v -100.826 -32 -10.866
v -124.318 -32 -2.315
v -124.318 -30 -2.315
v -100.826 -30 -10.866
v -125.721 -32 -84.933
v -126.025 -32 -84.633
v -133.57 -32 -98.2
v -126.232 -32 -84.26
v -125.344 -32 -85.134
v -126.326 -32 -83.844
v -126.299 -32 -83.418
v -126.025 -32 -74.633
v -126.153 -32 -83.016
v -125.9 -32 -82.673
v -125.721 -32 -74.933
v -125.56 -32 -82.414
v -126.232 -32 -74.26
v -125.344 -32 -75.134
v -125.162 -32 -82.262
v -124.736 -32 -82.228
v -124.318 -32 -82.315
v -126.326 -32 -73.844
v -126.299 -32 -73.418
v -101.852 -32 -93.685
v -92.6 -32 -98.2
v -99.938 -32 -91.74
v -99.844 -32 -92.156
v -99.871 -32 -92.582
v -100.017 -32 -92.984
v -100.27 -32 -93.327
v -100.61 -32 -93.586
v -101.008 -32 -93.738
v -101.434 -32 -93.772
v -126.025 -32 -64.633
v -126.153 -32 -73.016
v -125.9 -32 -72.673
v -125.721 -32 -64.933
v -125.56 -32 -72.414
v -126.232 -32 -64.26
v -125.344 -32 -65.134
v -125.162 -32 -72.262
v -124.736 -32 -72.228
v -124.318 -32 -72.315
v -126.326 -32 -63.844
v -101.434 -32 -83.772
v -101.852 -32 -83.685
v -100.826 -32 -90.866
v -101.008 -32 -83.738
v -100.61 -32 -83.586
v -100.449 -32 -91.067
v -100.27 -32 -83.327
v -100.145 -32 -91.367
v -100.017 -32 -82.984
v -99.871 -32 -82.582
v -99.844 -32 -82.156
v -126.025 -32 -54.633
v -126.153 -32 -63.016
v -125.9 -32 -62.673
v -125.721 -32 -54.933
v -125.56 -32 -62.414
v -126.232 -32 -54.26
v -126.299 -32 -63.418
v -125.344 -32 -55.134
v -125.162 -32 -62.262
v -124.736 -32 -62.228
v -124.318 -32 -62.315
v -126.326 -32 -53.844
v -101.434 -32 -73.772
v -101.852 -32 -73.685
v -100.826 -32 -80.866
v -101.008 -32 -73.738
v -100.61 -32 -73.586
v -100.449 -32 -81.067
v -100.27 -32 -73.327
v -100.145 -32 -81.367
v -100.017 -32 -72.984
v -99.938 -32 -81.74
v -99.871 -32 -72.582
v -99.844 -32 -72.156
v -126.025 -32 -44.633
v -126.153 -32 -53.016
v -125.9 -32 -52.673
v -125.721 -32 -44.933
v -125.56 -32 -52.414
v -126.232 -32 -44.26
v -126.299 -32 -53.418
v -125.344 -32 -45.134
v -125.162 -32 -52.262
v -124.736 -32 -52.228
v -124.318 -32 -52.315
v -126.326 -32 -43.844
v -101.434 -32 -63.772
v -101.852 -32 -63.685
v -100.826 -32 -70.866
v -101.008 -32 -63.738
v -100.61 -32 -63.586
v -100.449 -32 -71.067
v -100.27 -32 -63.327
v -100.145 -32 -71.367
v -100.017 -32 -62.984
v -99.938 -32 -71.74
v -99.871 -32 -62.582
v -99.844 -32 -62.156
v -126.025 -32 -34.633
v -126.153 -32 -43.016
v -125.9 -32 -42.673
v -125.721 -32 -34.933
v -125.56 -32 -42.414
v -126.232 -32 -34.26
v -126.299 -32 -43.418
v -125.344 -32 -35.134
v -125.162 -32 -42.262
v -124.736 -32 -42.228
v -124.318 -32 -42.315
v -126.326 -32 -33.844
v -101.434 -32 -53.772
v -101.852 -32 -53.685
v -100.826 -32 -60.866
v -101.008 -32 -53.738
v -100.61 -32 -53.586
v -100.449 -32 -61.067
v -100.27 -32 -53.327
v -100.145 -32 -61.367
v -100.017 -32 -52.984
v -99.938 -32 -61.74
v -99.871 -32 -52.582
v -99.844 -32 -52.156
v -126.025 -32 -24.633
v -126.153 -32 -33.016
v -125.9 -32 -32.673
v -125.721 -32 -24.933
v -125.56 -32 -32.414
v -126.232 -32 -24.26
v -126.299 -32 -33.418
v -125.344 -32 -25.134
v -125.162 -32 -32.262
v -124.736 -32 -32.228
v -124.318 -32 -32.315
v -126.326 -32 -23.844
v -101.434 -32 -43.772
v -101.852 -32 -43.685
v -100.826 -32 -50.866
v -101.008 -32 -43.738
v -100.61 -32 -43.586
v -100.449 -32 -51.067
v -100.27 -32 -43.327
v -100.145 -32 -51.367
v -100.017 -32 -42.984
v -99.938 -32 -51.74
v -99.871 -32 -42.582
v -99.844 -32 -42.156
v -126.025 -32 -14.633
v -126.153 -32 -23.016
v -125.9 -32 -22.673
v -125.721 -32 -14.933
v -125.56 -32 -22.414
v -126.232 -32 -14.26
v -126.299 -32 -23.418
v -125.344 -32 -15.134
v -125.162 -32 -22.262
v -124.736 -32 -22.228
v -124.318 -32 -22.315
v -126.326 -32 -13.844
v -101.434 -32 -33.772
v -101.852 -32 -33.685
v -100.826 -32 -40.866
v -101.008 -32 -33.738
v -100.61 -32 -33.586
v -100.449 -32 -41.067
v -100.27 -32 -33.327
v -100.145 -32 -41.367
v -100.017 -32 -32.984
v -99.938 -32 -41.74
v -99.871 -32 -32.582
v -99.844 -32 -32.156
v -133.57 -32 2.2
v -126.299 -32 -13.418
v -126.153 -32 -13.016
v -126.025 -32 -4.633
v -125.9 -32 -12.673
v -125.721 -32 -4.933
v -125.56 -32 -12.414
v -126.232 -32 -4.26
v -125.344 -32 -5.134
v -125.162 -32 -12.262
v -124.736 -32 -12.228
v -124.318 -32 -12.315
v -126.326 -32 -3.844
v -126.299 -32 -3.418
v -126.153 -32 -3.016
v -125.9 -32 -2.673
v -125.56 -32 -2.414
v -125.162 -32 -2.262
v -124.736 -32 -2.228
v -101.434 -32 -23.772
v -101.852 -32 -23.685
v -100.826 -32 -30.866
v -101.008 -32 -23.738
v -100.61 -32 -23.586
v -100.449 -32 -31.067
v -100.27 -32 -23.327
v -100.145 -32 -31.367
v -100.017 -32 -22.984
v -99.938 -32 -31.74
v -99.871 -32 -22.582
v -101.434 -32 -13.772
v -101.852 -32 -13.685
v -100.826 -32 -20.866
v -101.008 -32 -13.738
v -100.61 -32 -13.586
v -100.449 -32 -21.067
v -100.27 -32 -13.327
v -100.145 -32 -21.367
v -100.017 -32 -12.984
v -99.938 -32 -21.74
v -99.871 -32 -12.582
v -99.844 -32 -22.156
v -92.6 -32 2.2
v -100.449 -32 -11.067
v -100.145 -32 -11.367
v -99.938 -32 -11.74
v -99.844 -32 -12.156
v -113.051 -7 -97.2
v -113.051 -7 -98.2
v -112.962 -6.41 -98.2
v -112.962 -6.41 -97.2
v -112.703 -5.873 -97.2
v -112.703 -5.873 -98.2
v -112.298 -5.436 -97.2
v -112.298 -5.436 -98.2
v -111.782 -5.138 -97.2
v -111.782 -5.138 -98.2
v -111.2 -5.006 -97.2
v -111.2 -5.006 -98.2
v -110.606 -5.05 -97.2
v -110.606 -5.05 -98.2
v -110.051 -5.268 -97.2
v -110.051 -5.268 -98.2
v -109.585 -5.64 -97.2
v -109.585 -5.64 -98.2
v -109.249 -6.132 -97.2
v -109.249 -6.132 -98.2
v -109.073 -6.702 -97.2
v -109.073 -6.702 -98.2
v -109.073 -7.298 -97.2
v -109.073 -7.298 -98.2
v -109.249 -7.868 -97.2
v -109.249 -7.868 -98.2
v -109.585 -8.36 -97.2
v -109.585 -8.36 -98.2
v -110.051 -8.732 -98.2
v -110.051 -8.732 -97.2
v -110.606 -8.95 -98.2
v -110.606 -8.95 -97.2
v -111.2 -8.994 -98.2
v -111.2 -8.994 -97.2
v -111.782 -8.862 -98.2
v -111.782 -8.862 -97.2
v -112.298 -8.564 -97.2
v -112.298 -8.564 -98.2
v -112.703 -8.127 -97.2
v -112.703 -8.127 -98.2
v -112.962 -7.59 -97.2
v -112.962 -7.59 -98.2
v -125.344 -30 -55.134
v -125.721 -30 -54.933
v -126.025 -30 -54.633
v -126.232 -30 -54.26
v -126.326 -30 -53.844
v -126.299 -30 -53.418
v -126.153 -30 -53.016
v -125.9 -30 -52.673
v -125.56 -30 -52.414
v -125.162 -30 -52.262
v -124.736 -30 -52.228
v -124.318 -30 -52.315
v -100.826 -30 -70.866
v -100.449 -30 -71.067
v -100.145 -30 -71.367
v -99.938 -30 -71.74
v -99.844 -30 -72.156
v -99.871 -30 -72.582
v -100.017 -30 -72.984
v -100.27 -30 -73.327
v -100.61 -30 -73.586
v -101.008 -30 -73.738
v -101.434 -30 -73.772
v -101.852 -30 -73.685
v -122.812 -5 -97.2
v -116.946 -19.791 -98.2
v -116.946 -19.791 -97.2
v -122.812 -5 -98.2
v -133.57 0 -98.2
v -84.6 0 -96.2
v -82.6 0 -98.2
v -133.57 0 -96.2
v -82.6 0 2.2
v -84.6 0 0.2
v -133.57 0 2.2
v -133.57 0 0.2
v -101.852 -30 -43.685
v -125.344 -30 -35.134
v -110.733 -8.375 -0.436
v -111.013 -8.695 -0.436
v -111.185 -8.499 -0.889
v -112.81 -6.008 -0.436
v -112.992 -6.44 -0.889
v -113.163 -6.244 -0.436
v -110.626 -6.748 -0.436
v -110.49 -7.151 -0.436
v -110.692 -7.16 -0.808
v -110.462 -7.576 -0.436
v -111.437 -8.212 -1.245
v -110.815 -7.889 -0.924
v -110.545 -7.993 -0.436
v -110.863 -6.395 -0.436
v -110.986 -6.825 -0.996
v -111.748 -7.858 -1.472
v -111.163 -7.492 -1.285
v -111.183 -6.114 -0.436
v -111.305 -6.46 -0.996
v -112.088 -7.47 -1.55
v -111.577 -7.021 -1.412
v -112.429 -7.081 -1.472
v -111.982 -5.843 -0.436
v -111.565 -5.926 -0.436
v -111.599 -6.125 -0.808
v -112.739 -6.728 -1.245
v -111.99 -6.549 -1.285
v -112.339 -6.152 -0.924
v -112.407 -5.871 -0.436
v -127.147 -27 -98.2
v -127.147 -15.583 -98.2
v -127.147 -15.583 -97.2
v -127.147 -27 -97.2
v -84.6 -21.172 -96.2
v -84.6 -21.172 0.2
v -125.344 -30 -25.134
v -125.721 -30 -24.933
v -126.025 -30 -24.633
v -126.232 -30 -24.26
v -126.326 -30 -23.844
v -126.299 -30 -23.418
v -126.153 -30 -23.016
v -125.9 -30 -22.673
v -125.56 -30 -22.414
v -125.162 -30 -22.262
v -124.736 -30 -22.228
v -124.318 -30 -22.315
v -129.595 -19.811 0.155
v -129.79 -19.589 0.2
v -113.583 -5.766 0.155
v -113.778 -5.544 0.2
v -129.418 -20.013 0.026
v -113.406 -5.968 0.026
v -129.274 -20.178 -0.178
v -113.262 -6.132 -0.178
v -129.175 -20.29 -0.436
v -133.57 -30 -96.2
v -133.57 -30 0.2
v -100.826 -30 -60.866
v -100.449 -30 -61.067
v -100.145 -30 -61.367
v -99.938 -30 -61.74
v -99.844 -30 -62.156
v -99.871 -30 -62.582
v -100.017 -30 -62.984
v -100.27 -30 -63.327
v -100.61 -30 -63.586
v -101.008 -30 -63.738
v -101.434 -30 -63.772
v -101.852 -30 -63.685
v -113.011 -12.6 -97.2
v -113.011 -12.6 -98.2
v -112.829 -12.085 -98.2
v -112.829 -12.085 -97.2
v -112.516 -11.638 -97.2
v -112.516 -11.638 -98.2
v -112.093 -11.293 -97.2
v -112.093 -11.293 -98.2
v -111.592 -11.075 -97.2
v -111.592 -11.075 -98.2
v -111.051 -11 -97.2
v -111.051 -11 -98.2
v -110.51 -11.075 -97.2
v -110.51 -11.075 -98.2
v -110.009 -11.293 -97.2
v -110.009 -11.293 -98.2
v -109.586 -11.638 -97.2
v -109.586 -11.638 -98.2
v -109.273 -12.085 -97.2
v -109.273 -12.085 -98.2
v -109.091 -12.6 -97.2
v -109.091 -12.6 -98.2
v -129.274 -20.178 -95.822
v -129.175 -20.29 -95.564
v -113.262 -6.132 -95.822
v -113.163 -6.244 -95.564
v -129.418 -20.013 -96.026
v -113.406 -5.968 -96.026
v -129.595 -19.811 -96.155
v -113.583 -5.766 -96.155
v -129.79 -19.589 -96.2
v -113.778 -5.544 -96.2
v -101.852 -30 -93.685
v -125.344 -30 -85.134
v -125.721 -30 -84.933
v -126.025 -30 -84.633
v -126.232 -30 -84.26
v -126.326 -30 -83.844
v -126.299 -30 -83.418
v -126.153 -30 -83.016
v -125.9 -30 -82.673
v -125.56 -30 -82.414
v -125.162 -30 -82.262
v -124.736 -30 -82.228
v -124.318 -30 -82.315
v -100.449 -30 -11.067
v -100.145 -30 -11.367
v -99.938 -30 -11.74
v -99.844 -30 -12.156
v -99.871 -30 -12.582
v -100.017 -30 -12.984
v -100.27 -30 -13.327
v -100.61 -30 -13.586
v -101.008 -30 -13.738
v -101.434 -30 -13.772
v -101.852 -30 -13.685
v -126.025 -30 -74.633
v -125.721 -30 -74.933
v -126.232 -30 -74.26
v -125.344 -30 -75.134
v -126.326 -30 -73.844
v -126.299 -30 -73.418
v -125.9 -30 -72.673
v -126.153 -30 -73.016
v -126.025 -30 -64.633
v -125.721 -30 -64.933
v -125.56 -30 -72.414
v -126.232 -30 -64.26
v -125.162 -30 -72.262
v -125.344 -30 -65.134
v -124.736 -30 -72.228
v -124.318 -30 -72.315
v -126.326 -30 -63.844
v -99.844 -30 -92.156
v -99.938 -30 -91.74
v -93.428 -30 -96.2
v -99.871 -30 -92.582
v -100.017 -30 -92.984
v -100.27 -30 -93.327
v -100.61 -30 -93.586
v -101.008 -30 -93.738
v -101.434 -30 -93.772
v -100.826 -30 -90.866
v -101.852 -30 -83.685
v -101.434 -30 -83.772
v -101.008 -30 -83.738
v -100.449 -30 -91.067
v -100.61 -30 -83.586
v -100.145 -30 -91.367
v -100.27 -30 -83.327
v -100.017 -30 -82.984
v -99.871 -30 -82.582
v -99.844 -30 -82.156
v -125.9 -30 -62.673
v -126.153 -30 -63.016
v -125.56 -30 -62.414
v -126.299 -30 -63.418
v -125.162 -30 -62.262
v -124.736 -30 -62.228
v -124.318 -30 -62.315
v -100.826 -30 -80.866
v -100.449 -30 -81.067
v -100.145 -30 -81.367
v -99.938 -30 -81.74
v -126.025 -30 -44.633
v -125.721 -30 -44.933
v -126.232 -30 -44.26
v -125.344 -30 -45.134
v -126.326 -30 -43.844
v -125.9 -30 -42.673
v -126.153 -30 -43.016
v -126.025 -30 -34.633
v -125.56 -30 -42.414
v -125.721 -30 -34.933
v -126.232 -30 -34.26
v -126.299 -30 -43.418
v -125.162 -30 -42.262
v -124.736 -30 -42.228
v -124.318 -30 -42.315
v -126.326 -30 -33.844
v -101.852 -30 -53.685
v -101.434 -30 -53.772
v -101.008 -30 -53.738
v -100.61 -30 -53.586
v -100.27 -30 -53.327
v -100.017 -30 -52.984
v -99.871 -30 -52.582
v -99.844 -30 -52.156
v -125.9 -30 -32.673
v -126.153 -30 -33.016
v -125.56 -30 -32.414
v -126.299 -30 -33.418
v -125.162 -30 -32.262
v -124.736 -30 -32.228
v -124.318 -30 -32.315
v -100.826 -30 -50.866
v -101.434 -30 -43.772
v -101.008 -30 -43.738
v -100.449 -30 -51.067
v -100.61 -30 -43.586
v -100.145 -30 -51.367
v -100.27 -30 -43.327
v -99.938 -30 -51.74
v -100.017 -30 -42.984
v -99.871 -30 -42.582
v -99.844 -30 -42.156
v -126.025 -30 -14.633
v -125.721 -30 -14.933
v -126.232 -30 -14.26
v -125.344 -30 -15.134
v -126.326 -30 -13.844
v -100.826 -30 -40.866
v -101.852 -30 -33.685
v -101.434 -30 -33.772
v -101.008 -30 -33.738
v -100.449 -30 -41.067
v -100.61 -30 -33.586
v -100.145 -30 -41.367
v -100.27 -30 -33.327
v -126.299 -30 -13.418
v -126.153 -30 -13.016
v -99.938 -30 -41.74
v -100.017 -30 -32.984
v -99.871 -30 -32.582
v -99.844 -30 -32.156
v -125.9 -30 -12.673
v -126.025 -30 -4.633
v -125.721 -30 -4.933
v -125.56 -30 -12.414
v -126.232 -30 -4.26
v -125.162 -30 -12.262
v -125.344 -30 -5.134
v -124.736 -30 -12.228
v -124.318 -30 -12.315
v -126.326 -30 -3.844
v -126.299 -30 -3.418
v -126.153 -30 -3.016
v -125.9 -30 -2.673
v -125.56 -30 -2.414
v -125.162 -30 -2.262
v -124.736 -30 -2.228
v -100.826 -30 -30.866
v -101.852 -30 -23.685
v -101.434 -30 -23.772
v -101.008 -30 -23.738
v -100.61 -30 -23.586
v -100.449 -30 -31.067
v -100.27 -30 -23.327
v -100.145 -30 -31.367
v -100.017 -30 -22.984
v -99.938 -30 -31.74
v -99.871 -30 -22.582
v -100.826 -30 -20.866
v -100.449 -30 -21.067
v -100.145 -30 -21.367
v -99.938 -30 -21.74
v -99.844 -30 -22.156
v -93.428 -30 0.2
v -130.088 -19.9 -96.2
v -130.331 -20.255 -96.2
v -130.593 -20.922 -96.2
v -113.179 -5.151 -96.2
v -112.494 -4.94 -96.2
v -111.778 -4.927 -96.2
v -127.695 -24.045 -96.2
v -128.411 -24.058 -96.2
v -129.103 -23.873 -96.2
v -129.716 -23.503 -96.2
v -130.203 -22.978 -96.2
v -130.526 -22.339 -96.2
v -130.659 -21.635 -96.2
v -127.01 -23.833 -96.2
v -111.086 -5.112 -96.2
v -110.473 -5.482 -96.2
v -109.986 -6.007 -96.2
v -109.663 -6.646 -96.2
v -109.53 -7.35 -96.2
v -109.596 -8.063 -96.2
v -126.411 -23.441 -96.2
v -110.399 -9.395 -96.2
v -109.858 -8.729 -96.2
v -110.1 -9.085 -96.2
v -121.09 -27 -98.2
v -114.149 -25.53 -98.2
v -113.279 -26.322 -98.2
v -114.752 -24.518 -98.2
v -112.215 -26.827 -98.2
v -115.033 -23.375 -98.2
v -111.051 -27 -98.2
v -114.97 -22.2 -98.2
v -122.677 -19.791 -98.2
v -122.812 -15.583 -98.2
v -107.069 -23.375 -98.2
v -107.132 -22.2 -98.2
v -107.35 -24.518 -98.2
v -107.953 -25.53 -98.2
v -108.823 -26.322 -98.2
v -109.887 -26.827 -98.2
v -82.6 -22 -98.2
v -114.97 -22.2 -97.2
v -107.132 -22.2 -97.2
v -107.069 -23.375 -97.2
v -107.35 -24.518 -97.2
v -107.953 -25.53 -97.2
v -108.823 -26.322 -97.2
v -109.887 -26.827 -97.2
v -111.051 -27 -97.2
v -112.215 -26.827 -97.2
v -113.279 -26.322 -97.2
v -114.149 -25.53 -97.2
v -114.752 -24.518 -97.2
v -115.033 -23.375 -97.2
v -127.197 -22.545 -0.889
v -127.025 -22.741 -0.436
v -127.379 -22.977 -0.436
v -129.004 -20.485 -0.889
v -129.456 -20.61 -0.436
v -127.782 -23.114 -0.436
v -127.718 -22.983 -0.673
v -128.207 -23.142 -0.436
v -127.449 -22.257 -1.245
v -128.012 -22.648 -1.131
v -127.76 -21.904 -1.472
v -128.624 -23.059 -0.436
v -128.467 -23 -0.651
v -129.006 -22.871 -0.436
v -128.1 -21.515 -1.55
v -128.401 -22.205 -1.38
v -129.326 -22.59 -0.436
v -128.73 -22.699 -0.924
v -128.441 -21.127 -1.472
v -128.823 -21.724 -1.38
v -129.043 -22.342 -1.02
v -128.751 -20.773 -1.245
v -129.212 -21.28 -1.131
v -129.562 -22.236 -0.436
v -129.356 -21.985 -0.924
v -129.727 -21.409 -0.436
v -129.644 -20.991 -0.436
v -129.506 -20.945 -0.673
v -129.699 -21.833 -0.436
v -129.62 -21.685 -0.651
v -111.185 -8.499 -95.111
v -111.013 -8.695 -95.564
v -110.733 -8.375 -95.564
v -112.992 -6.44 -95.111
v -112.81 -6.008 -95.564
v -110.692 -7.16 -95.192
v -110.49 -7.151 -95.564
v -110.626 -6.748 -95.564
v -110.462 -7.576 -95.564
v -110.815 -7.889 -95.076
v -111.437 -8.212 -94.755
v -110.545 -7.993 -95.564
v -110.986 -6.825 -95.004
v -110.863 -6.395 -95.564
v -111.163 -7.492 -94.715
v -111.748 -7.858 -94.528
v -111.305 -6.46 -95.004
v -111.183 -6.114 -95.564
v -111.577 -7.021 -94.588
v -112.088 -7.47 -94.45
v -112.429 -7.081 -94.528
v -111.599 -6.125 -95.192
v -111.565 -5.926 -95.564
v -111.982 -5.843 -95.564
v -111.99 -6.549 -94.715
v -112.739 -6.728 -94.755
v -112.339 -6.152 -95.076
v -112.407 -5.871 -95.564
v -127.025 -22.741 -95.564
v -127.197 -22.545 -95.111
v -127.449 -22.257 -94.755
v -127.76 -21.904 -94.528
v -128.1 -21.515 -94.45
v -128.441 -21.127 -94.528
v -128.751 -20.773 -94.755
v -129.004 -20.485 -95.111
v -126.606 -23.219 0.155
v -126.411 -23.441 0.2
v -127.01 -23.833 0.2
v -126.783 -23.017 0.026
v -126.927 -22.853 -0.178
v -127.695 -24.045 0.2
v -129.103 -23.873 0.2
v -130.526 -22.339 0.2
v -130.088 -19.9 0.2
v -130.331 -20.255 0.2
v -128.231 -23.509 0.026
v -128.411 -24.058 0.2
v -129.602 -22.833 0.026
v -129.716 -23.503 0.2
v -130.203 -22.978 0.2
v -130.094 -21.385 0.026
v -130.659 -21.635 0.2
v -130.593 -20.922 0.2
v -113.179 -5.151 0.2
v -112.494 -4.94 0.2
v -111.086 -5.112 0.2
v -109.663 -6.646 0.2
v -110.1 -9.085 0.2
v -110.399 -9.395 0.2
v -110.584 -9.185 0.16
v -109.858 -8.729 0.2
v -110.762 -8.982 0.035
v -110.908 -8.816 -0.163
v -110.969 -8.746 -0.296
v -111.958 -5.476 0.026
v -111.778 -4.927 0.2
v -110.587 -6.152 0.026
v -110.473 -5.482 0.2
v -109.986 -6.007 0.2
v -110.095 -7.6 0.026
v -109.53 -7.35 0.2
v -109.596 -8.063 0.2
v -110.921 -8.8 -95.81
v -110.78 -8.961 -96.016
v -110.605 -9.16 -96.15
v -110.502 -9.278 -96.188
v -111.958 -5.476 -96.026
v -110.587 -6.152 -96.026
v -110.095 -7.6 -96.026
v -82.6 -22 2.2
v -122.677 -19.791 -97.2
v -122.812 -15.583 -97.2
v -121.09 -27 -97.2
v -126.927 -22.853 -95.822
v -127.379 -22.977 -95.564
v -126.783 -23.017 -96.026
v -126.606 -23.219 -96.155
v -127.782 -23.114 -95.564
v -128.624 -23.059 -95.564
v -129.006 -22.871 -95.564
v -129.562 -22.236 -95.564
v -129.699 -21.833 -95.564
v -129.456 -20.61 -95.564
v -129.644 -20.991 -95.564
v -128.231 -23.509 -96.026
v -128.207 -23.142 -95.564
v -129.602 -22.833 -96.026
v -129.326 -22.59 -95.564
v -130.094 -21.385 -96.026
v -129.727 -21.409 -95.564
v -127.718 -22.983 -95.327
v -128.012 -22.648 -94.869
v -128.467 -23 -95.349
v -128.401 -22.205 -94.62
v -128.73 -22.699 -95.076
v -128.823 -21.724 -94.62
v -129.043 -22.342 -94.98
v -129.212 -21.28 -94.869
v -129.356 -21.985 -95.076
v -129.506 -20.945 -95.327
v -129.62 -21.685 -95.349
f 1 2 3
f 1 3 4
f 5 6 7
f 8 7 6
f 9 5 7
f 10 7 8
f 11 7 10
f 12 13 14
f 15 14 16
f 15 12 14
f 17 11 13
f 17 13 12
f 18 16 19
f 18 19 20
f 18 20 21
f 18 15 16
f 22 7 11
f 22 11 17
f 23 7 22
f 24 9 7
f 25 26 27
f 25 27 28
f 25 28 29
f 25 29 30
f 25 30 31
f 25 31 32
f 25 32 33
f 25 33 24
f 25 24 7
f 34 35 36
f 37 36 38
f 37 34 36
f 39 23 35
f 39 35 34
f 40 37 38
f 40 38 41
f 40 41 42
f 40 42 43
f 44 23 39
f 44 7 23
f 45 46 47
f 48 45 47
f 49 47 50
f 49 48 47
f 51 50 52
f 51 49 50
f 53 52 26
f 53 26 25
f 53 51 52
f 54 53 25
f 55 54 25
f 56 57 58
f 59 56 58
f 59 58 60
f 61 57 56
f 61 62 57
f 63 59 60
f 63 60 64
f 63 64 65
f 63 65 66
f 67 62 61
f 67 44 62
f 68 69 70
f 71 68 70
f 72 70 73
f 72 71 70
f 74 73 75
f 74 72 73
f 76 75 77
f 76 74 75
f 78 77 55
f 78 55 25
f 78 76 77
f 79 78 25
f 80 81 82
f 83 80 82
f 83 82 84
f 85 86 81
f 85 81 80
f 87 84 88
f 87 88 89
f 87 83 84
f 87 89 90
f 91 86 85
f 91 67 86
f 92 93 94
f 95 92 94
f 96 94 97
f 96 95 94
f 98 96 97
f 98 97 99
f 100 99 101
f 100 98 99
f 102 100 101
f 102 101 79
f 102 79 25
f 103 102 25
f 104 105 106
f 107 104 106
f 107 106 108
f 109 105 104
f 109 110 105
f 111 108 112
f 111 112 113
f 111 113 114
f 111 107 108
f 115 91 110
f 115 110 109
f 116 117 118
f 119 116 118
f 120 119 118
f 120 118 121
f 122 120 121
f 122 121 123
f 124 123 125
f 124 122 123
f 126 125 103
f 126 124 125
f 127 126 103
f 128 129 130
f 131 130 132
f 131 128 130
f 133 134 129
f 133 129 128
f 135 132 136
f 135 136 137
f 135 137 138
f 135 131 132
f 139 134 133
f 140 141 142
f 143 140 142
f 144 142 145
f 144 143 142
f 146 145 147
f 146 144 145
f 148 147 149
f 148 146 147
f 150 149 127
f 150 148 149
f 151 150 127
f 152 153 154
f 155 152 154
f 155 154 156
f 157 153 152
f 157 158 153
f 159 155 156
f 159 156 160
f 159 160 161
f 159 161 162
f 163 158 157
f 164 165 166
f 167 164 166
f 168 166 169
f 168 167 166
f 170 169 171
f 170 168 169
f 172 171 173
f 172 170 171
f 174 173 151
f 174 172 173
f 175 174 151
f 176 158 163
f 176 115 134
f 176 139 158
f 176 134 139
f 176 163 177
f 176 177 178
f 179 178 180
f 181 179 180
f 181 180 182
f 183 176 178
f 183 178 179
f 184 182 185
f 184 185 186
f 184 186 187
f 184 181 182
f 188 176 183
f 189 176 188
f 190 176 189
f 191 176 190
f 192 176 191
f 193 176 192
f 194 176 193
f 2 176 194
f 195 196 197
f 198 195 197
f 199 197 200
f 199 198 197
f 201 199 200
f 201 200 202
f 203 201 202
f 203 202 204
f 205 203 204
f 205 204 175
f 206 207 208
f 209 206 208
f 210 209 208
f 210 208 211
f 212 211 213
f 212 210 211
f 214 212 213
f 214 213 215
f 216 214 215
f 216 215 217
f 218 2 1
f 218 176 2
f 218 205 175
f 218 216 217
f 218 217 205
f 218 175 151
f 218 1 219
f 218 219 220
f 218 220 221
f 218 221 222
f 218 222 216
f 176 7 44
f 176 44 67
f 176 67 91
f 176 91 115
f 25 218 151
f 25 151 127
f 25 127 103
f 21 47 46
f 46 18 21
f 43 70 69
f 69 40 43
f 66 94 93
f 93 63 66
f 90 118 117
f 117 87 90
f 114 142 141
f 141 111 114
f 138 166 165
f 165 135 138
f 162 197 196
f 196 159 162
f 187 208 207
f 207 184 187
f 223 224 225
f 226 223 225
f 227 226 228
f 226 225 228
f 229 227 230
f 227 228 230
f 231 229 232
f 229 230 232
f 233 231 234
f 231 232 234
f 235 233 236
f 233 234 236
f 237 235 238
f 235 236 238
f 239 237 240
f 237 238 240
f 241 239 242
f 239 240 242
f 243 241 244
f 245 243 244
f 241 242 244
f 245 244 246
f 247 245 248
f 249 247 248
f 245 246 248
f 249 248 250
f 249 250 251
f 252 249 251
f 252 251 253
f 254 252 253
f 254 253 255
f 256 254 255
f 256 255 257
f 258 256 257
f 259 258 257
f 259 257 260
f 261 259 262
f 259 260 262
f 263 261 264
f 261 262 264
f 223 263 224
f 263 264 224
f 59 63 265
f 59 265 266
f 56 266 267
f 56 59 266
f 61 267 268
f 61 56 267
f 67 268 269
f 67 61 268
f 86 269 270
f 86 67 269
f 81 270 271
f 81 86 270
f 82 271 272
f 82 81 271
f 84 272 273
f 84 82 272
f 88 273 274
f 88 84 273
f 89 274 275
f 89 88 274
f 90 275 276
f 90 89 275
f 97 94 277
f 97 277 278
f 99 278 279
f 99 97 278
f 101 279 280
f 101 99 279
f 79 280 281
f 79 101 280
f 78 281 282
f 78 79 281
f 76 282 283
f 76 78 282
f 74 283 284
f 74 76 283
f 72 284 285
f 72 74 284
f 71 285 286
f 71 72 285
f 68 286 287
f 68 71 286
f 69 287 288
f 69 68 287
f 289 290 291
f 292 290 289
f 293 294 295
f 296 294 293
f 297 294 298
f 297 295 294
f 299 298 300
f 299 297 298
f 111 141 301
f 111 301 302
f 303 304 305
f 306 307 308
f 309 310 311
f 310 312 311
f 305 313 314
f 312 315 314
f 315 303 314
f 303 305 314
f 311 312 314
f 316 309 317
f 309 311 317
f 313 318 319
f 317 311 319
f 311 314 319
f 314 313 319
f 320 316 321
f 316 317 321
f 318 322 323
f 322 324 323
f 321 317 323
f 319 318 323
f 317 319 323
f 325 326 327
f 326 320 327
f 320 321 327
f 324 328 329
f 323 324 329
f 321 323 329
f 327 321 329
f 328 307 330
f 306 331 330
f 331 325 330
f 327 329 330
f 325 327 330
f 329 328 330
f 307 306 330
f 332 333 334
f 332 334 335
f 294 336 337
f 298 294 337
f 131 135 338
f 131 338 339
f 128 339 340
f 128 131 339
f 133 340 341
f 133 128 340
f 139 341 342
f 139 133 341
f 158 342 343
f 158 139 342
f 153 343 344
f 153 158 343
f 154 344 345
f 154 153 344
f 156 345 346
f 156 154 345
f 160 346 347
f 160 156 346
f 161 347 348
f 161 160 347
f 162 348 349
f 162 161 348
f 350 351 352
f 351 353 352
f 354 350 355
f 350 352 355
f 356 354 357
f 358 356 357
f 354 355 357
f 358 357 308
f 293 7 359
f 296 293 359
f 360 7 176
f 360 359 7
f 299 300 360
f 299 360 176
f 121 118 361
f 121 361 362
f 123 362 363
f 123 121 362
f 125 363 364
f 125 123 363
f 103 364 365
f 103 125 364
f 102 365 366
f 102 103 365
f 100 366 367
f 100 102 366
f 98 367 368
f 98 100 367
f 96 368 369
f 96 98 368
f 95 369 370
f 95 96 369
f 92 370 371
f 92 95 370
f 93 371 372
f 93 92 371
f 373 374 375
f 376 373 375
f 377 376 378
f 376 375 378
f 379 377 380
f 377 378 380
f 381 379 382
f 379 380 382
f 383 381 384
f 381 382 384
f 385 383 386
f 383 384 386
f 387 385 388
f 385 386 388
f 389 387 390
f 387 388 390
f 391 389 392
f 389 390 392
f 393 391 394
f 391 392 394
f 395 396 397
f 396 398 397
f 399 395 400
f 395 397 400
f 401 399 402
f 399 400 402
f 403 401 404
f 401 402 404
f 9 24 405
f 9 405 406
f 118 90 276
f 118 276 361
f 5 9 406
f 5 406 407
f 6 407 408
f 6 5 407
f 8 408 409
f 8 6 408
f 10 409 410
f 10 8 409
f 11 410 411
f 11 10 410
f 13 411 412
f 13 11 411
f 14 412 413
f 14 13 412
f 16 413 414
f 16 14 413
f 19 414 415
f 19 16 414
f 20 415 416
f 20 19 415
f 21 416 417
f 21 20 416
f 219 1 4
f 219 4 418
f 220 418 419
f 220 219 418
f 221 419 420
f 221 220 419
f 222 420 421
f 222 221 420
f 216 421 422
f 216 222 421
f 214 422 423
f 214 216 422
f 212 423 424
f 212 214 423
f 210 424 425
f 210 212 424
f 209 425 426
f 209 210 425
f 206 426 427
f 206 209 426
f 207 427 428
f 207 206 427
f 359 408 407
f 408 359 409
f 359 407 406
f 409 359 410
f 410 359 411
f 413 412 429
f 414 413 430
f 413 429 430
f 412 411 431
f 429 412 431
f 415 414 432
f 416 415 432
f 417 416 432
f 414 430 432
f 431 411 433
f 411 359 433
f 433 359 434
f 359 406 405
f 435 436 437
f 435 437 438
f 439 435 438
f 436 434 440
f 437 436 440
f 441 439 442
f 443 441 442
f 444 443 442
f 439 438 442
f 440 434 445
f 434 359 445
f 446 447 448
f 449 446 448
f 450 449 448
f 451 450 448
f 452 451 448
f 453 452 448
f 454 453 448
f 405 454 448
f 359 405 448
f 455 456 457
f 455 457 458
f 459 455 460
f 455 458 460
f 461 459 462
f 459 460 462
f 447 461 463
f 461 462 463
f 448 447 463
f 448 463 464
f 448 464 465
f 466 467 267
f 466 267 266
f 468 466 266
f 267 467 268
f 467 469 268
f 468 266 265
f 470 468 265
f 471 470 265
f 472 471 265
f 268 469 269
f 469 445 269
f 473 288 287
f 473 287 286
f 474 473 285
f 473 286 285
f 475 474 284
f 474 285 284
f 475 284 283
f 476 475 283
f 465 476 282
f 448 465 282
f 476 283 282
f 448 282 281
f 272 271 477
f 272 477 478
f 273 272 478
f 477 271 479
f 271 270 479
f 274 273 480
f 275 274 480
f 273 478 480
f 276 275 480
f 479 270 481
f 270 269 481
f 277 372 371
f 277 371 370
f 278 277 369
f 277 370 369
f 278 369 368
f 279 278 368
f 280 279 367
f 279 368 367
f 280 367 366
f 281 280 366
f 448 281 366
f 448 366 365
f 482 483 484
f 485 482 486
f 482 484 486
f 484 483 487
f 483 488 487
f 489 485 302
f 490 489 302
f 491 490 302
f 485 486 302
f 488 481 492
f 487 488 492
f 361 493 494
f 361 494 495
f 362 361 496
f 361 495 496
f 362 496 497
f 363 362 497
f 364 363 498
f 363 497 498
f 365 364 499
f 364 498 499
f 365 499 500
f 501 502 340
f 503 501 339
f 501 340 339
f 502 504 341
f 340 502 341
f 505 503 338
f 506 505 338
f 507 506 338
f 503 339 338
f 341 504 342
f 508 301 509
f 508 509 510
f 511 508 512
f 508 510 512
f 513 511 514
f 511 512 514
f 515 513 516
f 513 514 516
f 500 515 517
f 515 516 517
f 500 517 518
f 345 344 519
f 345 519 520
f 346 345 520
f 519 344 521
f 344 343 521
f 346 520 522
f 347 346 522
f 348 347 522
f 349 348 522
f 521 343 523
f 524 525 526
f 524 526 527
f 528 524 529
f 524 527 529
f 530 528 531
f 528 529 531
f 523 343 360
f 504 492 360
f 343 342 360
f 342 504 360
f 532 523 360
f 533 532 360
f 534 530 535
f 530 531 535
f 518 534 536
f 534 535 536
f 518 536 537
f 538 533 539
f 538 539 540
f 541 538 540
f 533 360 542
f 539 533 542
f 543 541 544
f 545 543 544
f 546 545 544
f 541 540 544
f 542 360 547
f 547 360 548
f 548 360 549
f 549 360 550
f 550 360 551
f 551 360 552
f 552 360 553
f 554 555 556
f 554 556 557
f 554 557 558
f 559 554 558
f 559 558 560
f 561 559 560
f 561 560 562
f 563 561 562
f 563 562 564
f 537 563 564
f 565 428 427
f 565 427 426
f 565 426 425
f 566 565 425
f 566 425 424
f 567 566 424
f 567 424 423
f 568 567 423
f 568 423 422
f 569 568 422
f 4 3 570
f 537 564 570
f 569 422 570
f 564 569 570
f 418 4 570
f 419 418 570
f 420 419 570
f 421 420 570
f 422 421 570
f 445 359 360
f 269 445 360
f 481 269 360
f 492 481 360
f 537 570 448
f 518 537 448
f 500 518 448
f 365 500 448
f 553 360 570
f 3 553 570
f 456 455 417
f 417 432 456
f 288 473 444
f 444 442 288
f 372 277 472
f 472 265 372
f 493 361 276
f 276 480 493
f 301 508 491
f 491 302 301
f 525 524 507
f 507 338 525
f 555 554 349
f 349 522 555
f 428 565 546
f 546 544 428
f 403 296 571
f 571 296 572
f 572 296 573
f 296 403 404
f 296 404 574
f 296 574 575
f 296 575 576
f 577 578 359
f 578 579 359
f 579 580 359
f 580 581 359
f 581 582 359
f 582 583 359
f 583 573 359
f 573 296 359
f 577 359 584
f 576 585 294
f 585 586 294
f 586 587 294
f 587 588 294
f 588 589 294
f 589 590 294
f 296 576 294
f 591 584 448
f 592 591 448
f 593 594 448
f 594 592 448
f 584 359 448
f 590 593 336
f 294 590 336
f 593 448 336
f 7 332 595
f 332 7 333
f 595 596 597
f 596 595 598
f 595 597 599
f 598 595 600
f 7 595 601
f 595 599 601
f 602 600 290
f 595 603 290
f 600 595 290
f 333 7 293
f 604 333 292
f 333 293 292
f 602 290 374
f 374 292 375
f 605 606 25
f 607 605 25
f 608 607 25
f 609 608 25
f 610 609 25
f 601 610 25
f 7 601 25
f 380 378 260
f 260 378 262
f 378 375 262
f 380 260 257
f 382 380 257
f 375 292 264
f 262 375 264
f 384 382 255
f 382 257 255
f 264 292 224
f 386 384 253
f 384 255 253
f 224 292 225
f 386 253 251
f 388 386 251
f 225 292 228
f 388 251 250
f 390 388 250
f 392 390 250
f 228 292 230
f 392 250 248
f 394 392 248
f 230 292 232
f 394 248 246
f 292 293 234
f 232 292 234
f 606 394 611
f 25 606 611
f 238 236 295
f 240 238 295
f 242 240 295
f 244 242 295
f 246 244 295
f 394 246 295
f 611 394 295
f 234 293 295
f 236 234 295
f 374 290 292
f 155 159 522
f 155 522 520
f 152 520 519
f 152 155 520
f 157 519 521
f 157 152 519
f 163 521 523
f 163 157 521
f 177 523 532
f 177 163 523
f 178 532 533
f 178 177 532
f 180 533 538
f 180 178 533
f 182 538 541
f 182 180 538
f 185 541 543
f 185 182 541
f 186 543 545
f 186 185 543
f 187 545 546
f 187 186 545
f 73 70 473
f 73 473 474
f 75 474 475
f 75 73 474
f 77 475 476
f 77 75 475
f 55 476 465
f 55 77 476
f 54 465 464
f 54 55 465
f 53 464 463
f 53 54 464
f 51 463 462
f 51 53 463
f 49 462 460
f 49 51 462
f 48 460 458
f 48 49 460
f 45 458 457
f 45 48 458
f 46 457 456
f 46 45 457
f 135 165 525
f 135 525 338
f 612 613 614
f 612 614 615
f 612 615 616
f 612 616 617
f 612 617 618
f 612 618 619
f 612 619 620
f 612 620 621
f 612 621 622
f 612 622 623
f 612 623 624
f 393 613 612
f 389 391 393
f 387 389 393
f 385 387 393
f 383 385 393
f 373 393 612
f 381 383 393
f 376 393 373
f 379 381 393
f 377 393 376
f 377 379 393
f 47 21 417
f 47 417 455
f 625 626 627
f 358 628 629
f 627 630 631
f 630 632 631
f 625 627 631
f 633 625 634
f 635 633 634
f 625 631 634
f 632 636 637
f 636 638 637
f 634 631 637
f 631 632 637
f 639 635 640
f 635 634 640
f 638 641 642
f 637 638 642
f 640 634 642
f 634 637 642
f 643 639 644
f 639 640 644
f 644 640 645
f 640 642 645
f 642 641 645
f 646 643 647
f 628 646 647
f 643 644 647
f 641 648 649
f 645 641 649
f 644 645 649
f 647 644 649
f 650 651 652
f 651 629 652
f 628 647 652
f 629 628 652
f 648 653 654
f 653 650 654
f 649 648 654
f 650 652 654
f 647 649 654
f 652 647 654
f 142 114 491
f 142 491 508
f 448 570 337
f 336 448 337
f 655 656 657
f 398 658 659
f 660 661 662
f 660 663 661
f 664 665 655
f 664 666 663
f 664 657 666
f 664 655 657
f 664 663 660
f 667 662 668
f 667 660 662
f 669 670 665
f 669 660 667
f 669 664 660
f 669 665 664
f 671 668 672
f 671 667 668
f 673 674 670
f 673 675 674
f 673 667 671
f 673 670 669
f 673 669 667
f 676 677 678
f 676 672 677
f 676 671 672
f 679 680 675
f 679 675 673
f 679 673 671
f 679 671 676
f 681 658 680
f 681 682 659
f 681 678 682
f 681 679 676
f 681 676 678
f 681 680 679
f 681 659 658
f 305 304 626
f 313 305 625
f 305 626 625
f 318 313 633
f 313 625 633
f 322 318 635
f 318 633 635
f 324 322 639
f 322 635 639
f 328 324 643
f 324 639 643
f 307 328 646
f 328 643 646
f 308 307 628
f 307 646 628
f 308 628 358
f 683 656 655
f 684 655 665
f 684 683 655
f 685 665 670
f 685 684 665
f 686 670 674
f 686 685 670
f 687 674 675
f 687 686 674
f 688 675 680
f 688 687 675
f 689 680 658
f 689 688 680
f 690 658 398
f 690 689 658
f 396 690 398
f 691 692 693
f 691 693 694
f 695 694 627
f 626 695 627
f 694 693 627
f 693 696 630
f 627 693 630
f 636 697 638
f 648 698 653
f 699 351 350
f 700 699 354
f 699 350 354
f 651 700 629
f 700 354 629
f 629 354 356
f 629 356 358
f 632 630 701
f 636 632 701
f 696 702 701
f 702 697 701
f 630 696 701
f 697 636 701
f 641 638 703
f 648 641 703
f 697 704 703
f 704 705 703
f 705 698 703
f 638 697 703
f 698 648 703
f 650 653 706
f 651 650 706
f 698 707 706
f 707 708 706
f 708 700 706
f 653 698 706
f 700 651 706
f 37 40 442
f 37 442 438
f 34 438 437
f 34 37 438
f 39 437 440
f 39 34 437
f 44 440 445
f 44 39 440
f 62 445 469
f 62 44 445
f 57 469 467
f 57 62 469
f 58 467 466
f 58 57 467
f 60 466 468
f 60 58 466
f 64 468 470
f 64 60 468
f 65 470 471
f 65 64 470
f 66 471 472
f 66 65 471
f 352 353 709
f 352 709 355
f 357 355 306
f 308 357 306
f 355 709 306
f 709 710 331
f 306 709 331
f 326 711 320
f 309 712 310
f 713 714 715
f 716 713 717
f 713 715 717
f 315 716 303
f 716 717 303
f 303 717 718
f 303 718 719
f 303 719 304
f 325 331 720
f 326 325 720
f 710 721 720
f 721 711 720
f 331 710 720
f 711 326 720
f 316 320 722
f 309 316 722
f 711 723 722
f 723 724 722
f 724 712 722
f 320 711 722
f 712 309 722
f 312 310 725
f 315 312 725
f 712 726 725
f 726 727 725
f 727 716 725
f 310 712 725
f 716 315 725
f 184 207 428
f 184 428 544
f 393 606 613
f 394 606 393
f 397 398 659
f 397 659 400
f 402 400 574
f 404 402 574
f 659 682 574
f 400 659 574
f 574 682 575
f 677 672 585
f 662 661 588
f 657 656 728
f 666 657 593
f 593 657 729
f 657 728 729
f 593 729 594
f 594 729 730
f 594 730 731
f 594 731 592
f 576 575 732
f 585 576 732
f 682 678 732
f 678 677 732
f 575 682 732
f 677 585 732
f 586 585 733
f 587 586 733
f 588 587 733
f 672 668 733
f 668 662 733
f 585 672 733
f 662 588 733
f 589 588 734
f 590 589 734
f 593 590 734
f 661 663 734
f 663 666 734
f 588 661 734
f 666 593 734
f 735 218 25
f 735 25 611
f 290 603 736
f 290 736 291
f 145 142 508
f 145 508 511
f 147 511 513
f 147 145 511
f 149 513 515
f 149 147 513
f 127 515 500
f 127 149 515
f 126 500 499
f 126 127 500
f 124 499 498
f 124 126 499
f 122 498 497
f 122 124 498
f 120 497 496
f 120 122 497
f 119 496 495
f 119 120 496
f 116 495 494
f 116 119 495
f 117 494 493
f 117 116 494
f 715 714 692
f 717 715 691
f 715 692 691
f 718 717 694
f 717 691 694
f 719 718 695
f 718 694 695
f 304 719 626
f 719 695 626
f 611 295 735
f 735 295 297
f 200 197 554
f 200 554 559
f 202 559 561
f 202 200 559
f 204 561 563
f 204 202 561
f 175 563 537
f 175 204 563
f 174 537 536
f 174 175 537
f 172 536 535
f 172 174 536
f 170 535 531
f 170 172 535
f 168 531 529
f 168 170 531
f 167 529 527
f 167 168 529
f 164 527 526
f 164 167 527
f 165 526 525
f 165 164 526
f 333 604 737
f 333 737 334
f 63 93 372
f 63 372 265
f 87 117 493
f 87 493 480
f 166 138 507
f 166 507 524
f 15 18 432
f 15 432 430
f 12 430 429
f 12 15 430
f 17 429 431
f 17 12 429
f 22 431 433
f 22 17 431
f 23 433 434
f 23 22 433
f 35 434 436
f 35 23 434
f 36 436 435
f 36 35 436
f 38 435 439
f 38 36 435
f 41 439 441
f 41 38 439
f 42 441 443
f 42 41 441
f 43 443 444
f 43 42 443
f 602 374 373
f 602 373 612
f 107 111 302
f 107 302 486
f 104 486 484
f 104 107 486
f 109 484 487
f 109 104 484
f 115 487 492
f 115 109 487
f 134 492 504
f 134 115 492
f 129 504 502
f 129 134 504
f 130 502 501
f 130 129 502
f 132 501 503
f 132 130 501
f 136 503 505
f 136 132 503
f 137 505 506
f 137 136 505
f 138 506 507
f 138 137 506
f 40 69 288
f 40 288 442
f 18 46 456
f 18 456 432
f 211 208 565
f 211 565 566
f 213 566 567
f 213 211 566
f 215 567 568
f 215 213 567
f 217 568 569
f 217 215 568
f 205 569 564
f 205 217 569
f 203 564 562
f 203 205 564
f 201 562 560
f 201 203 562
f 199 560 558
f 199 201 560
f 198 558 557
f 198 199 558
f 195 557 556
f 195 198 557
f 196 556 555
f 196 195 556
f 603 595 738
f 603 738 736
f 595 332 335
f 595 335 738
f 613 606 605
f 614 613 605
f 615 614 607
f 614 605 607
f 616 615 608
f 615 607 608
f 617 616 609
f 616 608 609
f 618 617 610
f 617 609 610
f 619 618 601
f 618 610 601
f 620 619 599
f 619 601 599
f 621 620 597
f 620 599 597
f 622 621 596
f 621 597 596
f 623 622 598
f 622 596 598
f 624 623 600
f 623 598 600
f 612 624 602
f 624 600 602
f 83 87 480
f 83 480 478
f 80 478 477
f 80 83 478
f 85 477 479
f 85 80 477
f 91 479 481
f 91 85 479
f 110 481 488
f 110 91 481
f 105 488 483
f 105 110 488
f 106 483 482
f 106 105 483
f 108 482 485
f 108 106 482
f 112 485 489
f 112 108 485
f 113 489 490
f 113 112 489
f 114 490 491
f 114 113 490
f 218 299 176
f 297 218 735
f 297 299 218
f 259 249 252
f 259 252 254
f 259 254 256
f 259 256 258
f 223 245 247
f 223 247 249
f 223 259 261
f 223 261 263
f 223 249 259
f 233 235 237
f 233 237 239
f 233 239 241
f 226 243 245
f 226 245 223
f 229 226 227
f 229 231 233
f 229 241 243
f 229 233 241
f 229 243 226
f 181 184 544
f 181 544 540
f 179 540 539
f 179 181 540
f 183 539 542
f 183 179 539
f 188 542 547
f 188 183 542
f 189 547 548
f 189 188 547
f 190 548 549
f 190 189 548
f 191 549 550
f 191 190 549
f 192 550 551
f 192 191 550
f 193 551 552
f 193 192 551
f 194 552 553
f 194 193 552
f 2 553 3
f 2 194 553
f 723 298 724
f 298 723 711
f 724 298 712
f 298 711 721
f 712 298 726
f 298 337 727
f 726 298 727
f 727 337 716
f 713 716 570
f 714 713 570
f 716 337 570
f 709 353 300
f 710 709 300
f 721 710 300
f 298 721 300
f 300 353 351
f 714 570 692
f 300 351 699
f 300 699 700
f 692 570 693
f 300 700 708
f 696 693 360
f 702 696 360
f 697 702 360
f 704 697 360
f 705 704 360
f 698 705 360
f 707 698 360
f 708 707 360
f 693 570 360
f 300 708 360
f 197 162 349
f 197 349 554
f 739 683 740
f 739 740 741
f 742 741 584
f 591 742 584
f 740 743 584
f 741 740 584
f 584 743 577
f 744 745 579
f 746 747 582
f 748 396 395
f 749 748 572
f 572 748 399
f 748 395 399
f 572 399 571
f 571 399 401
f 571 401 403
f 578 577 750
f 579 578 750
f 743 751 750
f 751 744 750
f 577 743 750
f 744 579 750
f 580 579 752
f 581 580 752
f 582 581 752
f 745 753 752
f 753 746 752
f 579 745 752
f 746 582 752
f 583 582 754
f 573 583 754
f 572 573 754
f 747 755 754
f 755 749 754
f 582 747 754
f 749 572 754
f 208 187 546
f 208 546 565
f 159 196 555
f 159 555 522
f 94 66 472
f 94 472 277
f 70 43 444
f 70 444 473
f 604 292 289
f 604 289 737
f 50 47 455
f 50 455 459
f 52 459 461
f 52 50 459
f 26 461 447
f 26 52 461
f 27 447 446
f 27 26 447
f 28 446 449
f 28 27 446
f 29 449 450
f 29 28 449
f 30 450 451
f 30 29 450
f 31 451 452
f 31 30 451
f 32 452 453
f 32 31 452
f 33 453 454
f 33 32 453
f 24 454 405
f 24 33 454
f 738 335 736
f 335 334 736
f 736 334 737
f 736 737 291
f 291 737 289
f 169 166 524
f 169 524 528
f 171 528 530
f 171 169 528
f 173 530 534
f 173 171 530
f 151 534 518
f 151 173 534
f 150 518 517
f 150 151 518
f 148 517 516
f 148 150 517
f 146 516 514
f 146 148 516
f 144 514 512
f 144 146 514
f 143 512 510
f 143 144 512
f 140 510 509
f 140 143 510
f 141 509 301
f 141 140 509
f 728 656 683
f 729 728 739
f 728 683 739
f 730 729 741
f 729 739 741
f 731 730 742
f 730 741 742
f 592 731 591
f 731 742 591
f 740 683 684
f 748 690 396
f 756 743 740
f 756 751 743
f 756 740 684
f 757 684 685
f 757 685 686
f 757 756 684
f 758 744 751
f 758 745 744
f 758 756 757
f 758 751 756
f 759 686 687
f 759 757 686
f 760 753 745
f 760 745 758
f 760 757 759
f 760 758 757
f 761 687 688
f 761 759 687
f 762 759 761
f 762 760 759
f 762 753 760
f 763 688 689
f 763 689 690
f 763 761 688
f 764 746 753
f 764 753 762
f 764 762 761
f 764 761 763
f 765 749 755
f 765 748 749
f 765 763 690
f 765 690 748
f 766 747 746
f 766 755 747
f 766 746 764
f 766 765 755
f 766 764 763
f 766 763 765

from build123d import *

# Parameters (mm, degrees)
BOSS_EXTRUDE1_DEPTH = 30
SKETCH3_W           = 50.97
SKETCH3_H           = 100.4
BOSS_EXTRUDE2_DEPTH = 2
REVOLVE1_ANGLE      = 358
FILLET1_R           = 1
CUT_EXTRUDE1_DEPTH  = 101
BOSS_EXTRUDE3_REACH = 170.96
CUT_EXTRUDE2_DEPTH  = 2
LPATTERN1_COUNT     = 5
LPATTERN1_PITCH     = 10
LPATTERN2_COUNT     = 5
LPATTERN2_PITCH     = 10
SKETCH9_R           = 2
SKETCH9_R_2         = 4
CUT_EXTRUDE3_DEPTH  = 1


with BuildPart() as part:
    # Sketch2 → Boss-Extrude1 (new body)
    with BuildSketch(Plane.XZ.offset(30)):
        Polygon((-133.57, -96.2), (-84.6, -96.2), (-84.6, 0.2), (-133.57, 0.2), (-133.57, 2.2), (-82.6, 2.2), (-82.6, -98.2), (-133.57, -98.2), align=None)
    extrude(amount=-BOSS_EXTRUDE1_DEPTH)

    # Sketch3 → Boss-Extrude2 (add)
    with BuildSketch(Plane.XZ.offset(30)):
        with Locations((-108.085, -48)):
            Rectangle(SKETCH3_W, SKETCH3_H)
    extrude(amount=BOSS_EXTRUDE2_DEPTH)

    # Sketch4 → Revolve1 (revolve)
    with BuildSketch(Plane(origin=(0, 0, 0.2), x_dir=(-1, 0, 0), z_dir=(0, 0, -1))):
        with BuildLine():
            ThreePointArc((126.946389188, -22.830754007), (128.214647144, -23.261442668), (129.415983818, -22.669191741))
            Line((129.415983818, -22.669191741), (110.772864663, -6.315578448))
            ThreePointArc((110.772864663, -6.315578448), (110.342176002, -7.583836403), (110.934426929, -8.785173077))
            Line((110.934426929, -8.785173077), (126.946389188, -22.830754007))
        make_face()
    revolve1 = revolve(axis=Axis((-128.10040537, -21.515175559, 0.2), (0.7517591128712743, 0.6594378183081363, 0)), revolution_arc=REVOLVE1_ANGLE)

    # Mirror3: Revolve1 across plane
    add(revolve1.mirror(Plane(origin=(0, 0, -48), x_dir=(1, 0, 0), z_dir=(0, 0, -1))))

    # Fillet1
    fillet1_edges = [part.edges().sort_by_distance(p)[0] for p in [
        (-128.214647144, -23.261442668, 0.2),
        (-121.248440423, -13.176806647, 0.2),
        (-111.974201337, -5.72332752, 0.2),
        (-118.940408059, -15.807963542, 0.2),
        (-128.214647144, -23.261442668, -96.2),
        (-121.248440423, -13.176806647, -96.2),
        (-111.974201337, -5.72332752, -96.2),
        (-118.940408059, -15.807963542, -96.2),
    ]]
    fillet(fillet1_edges, radius=FILLET1_R)

    # Sketch5 → Cut-Extrude1 (cut)
    with BuildSketch(Plane(origin=(0, 0, -98.2), x_dir=(-1, 0, 0), z_dir=(0, 0, -1))):
        Polygon((92.6, -32), (82.6, -22), (82.6, -32), align=None)
    extrude(amount=-CUT_EXTRUDE1_DEPTH, mode=Mode.SUBTRACT)

    # Sketch7 → Boss-Extrude3 (add, up to next)
    with BuildSketch(Plane(origin=(0, 0, 0.2), x_dir=(-1, 0, 0), z_dir=(0, 0, -1)), mode=Mode.PRIVATE) as boss_extrude3_sk1:
        Polygon((93.428427125, -30), (84.6, -21.171572875), (84.6, -24), (90.6, -30), align=None)
    boss_extrude3_tool1 = extrude(boss_extrude3_sk1.sketch, amount=BOSS_EXTRUDE3_REACH, mode=Mode.PRIVATE) - part.part
    add(boss_extrude3_tool1.solids().sort_by_distance((-88.352065, -26.247935, 0.2))[0])

    # Sketch8 → Cut-Extrude2 (cut)
    with BuildSketch(Plane.XZ.offset(32)):
        with BuildLine():
            Line((-101.851872455, -53.684790723), (-125.344187975, -45.13428714))
            ThreePointArc((-125.344187975, -45.13428714), (-126.240696691, -43.211717993), (-124.318127545, -42.315209277))
            Line((-124.318127545, -42.315209277), (-100.825812025, -50.86571286))
            ThreePointArc((-100.825812025, -50.86571286), (-99.929303309, -52.788282007), (-101.851872455, -53.684790723))
        make_face()
    cut_extrude2 = extrude(amount=-CUT_EXTRUDE2_DEPTH, mode=Mode.SUBTRACT)

    # LPattern1: Cut-Extrude2 ×5
    with Locations(*[(0, 0, -i * LPATTERN1_PITCH) for i in range(1, LPATTERN1_COUNT)]):
        add(cut_extrude2, mode=Mode.SUBTRACT)

    # LPattern2: Cut-Extrude2 ×5
    with Locations(*[(0, 0, i * LPATTERN2_PITCH) for i in range(1, LPATTERN2_COUNT)]):
        add(cut_extrude2, mode=Mode.SUBTRACT)

    # Sketch9 → Cut-Extrude3 (cut)
    with BuildSketch(Plane(origin=(0, 0, -98.2), x_dir=(-1, 0, 0), z_dir=(0, 0, -1))):
        with Locations((111.05096655, -7)):
            Circle(SKETCH9_R)
        with Locations((111.05096655, -23)):
            Circle(SKETCH9_R_2)
        with Locations((111.05096655, -13)):
            Circle(SKETCH9_R)
        Polygon((127.147055737, -27), (121.090407141, -27), (122.676520454, -19.790973413), (116.946384418, -19.790973413), (122.811770426, -5), (122.811770426, -15.583196494), (127.147055737, -15.583196494), align=None)
        Polygon((113.010558344, -12.6), (114.970150138, -22.2), (107.131782961, -22.2), (109.091374756, -12.6), align=None)
    extrude(amount=-CUT_EXTRUDE3_DEPTH, mode=Mode.SUBTRACT)


solid = part.part
